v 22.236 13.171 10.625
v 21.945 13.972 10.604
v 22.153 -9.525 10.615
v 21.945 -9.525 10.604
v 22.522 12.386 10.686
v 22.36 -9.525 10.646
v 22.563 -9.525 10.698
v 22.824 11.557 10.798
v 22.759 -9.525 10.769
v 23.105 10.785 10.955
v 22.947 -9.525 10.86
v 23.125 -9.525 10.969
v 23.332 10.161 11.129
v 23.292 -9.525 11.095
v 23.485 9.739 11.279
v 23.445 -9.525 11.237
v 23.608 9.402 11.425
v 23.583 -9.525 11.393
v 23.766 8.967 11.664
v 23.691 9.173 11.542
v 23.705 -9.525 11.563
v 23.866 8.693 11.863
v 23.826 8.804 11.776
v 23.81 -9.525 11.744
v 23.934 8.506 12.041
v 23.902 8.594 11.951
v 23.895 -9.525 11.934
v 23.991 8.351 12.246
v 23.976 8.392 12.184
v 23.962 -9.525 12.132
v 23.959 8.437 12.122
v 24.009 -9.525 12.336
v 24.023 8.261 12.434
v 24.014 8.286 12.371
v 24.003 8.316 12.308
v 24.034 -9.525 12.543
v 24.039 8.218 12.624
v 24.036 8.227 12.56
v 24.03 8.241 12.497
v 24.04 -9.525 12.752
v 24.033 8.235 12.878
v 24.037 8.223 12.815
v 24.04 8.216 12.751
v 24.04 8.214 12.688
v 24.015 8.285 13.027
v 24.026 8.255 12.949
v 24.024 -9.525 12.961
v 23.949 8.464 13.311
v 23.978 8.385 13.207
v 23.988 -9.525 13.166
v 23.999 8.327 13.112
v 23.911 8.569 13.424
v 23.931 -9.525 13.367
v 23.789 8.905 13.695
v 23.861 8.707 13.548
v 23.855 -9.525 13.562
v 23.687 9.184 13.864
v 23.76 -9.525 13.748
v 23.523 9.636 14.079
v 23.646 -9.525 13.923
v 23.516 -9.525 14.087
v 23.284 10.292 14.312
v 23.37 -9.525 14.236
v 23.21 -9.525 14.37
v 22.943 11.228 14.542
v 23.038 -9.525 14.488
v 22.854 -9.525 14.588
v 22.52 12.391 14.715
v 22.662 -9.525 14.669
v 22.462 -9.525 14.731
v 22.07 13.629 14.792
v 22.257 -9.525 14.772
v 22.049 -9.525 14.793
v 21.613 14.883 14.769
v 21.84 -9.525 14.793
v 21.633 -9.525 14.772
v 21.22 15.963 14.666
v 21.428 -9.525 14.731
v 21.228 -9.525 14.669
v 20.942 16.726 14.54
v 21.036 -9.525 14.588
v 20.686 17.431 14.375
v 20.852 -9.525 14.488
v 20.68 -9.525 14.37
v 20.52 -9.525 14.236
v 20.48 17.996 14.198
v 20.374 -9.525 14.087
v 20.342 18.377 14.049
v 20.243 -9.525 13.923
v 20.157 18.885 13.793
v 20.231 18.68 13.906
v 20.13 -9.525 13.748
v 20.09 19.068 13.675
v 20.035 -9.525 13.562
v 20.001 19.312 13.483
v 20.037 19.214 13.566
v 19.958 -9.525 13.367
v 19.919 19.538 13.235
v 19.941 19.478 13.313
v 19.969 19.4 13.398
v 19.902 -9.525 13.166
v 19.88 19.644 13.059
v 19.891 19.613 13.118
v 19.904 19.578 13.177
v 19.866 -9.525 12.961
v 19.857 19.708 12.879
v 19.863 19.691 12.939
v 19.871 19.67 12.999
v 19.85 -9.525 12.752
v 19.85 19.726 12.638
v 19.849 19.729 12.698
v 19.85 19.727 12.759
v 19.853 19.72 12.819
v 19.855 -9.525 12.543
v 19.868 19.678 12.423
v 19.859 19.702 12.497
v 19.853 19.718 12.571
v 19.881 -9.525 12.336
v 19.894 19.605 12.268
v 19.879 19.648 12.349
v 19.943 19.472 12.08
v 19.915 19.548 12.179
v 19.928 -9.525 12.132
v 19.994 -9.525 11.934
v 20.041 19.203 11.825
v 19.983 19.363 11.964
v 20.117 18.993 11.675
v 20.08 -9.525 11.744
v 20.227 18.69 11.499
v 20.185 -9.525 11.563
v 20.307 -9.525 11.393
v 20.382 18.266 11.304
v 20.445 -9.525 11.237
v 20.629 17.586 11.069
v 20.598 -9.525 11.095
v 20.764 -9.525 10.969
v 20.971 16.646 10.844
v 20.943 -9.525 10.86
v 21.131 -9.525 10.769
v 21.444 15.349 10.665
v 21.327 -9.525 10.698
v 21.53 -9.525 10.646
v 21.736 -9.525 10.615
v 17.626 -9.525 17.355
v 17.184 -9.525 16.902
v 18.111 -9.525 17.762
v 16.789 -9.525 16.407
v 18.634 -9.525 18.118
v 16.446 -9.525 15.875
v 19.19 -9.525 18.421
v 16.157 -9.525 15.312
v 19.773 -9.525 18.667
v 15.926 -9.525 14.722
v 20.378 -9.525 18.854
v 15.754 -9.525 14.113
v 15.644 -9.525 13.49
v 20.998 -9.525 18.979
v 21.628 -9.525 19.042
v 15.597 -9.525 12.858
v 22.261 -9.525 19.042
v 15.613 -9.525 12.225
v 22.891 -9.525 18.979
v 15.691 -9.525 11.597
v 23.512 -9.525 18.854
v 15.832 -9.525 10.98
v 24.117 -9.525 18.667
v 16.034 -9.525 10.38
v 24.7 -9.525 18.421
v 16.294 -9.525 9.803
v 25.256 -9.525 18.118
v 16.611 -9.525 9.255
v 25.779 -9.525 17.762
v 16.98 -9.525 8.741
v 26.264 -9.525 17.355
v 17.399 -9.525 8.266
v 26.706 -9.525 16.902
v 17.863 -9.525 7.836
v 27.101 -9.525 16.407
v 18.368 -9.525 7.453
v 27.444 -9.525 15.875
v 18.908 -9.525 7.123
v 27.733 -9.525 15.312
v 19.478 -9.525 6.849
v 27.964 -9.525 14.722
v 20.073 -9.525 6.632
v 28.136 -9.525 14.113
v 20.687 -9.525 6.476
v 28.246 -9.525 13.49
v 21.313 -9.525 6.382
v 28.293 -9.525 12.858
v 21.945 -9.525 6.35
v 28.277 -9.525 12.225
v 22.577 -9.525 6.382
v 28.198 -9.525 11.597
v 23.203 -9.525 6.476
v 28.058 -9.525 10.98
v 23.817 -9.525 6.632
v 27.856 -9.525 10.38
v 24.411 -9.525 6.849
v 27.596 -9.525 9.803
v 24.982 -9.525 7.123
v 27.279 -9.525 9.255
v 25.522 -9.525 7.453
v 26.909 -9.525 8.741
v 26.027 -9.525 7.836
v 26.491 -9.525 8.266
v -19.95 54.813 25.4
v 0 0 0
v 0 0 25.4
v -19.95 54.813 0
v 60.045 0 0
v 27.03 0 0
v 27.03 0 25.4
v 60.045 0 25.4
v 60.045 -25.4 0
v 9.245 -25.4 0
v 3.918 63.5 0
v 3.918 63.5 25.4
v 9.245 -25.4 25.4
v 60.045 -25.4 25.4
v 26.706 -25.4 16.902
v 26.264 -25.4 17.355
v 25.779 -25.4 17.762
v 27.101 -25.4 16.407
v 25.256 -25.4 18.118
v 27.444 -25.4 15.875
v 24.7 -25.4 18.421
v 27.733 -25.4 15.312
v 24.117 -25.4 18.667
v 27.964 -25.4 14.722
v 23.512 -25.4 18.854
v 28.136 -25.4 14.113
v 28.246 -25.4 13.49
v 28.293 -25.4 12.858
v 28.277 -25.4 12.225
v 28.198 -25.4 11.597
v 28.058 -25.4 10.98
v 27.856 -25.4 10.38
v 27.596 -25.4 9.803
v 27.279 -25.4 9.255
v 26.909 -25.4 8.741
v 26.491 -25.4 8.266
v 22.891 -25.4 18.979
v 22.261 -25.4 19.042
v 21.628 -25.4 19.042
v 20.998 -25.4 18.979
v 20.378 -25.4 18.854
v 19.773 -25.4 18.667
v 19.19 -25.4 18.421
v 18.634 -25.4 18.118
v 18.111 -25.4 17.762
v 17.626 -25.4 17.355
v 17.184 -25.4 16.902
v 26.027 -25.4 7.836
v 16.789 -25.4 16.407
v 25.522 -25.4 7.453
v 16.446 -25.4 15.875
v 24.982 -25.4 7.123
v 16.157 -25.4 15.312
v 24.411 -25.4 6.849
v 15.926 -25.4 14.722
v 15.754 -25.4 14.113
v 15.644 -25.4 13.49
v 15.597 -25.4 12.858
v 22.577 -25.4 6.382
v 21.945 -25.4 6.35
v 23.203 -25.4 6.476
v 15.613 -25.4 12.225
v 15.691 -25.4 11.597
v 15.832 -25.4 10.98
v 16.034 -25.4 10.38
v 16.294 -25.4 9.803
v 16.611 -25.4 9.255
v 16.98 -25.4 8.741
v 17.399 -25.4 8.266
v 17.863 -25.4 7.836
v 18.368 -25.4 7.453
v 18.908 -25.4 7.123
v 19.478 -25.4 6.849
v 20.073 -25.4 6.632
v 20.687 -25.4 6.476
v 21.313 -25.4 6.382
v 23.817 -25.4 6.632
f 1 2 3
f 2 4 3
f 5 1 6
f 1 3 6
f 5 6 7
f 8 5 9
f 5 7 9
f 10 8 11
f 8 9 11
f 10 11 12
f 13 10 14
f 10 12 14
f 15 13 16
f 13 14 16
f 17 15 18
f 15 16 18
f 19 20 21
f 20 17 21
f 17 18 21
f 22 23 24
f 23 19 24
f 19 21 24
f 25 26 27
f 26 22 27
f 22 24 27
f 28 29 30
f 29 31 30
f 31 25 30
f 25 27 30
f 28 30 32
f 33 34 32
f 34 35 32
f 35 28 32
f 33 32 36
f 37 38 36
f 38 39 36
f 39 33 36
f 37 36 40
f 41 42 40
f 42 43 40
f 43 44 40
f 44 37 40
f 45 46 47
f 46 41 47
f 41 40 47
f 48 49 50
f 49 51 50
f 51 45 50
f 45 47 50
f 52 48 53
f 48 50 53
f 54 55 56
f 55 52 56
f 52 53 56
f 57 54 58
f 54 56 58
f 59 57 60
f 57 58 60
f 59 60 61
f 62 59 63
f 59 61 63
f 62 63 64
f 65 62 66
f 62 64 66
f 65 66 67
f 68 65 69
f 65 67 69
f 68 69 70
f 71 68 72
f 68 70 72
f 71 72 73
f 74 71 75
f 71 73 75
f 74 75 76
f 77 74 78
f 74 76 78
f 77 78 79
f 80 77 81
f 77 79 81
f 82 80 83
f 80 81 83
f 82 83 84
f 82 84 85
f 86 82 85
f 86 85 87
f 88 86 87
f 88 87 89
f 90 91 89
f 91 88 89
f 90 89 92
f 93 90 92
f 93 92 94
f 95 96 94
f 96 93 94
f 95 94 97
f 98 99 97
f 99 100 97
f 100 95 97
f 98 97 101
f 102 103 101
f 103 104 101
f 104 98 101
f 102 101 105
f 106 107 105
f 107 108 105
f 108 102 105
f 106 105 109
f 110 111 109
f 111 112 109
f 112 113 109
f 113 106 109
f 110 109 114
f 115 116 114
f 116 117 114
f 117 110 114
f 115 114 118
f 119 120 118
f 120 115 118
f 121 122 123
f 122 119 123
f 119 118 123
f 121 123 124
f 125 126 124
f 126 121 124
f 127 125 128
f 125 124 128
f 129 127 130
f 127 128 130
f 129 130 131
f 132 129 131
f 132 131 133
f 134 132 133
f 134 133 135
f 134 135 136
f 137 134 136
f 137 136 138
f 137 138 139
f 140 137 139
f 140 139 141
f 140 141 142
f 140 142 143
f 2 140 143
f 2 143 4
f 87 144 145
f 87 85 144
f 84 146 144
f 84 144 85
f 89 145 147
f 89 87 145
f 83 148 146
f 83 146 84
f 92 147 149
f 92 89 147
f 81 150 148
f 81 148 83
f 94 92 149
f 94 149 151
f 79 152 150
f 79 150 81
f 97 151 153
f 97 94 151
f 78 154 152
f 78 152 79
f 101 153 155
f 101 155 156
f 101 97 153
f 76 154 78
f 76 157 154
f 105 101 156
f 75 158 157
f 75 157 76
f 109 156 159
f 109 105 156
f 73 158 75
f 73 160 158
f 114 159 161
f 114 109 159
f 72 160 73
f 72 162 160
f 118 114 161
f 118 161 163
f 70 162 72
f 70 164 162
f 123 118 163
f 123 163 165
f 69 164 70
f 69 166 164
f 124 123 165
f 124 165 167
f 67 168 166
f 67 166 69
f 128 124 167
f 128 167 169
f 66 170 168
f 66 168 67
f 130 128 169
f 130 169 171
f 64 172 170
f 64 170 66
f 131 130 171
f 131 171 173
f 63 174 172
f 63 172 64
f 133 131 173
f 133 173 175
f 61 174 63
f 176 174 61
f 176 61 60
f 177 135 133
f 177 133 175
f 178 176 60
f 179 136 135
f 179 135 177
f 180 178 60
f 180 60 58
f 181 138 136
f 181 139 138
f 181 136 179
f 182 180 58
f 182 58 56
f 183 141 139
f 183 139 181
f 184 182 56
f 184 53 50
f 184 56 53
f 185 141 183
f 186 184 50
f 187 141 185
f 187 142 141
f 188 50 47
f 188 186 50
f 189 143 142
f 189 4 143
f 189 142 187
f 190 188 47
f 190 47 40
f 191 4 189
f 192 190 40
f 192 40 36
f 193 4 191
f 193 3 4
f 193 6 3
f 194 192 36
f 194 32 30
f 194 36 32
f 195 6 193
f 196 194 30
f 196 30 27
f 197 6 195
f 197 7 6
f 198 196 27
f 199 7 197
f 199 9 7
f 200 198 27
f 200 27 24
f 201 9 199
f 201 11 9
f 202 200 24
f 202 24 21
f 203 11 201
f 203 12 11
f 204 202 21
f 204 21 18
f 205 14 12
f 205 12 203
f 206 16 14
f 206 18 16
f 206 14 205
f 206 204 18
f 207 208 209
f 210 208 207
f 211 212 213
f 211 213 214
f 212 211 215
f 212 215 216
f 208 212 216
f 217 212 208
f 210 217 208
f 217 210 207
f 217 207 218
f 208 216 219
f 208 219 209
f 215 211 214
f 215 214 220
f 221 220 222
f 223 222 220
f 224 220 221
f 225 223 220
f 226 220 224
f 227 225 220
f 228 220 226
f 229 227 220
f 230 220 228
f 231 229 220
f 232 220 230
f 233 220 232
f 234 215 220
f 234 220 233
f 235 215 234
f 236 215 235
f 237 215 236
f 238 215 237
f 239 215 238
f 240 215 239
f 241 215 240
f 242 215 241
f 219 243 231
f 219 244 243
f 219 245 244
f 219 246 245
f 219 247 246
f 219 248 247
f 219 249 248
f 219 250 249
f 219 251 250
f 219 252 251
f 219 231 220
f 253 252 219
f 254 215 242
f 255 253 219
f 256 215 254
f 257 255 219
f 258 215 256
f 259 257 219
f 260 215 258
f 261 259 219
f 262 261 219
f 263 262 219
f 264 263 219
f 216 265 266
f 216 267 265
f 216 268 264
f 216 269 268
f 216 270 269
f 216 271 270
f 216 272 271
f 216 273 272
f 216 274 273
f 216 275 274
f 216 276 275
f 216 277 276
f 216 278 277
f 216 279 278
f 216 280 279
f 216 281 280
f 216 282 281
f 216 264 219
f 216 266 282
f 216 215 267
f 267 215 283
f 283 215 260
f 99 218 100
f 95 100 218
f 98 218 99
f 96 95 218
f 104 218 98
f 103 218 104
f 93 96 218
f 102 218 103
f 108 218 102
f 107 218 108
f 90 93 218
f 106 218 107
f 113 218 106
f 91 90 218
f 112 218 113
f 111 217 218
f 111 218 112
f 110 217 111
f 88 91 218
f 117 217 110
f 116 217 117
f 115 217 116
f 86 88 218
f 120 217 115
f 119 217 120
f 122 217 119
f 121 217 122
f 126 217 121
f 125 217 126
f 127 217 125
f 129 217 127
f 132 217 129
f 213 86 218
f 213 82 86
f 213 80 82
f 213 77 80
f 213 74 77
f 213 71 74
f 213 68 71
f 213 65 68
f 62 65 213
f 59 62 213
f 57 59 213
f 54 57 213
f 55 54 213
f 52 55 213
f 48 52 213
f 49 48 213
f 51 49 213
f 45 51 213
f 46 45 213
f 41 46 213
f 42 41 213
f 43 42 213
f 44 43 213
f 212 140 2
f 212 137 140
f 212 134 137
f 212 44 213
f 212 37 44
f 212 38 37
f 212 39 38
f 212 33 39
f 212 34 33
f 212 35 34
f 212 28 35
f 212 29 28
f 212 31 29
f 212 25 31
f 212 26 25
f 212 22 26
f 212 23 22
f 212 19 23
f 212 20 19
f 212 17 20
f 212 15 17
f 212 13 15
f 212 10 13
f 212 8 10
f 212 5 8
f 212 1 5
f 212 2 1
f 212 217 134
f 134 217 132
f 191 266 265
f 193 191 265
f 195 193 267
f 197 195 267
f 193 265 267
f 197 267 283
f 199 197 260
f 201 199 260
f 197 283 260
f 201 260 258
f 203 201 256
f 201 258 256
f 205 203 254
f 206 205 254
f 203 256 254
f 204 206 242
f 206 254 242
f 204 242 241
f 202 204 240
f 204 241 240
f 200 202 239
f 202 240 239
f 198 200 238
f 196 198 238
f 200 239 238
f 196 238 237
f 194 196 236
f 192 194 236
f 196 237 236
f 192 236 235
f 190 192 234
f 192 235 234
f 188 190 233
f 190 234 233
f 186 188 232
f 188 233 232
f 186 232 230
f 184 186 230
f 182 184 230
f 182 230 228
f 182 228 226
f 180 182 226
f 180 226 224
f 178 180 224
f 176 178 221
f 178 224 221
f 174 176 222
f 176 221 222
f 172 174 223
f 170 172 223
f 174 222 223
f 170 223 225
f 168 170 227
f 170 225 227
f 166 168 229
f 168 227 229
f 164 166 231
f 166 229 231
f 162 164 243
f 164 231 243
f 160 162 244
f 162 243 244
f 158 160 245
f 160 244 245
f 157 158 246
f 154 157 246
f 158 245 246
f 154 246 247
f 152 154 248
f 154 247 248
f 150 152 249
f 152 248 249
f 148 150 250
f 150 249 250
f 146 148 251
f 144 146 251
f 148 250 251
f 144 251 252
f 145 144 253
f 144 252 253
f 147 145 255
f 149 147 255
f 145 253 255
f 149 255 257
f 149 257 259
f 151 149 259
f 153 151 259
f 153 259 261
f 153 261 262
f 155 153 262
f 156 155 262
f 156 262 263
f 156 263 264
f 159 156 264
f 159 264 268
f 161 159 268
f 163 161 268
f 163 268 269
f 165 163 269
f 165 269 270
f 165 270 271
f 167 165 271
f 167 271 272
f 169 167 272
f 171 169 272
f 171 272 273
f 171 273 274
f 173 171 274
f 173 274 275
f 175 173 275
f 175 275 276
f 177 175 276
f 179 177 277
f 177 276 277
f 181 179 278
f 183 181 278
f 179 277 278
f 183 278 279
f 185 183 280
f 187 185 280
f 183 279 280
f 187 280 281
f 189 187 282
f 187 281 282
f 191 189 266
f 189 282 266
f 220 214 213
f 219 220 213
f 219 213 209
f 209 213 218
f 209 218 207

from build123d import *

# Parameters (mm, degrees)
BOSS_EXTRUDE1_DEPTH = 25.4
SKETCH3_R           = 6.35
CUT_EXTRUDE1_DEPTH  = 15.875
SKETCH4_R           = 2.0955
CUT_EXTRUDE2_DEPTH  = 98.893788925


with BuildPart() as part:
    # Sketch1 → Boss-Extrude1 (new body)
    with BuildSketch(Plane.XY):
        Polygon((0, 0), (-19.950187023, 54.81268836), (3.918005545, 63.5), (27.030115421, 0), (60.04484395, 0), (60.04484395, -25.4), (9.24484395, -25.4), align=None)
    extrude(amount=BOSS_EXTRUDE1_DEPTH)

    # Sketch3 → Cut-Extrude1 (cut)
    with BuildSketch(Plane.XZ.offset(25.4)):
        with Locations(Location((21.94484395, 12.7, 0), (0, 0, 270))):
            Circle(SKETCH3_R)
    extrude(amount=-CUT_EXTRUDE1_DEPTH, mode=Mode.SUBTRACT)

    # Sketch4 → Cut-Extrude2 (cut, through all)
    with BuildSketch(Plane.XZ.offset(9.525)):
        with Locations(Location((21.94484395, 12.7, 0), (0, 0, 270))):
            Circle(SKETCH4_R)
    extrude(amount=-CUT_EXTRUDE2_DEPTH, mode=Mode.SUBTRACT)


solid = part.part
